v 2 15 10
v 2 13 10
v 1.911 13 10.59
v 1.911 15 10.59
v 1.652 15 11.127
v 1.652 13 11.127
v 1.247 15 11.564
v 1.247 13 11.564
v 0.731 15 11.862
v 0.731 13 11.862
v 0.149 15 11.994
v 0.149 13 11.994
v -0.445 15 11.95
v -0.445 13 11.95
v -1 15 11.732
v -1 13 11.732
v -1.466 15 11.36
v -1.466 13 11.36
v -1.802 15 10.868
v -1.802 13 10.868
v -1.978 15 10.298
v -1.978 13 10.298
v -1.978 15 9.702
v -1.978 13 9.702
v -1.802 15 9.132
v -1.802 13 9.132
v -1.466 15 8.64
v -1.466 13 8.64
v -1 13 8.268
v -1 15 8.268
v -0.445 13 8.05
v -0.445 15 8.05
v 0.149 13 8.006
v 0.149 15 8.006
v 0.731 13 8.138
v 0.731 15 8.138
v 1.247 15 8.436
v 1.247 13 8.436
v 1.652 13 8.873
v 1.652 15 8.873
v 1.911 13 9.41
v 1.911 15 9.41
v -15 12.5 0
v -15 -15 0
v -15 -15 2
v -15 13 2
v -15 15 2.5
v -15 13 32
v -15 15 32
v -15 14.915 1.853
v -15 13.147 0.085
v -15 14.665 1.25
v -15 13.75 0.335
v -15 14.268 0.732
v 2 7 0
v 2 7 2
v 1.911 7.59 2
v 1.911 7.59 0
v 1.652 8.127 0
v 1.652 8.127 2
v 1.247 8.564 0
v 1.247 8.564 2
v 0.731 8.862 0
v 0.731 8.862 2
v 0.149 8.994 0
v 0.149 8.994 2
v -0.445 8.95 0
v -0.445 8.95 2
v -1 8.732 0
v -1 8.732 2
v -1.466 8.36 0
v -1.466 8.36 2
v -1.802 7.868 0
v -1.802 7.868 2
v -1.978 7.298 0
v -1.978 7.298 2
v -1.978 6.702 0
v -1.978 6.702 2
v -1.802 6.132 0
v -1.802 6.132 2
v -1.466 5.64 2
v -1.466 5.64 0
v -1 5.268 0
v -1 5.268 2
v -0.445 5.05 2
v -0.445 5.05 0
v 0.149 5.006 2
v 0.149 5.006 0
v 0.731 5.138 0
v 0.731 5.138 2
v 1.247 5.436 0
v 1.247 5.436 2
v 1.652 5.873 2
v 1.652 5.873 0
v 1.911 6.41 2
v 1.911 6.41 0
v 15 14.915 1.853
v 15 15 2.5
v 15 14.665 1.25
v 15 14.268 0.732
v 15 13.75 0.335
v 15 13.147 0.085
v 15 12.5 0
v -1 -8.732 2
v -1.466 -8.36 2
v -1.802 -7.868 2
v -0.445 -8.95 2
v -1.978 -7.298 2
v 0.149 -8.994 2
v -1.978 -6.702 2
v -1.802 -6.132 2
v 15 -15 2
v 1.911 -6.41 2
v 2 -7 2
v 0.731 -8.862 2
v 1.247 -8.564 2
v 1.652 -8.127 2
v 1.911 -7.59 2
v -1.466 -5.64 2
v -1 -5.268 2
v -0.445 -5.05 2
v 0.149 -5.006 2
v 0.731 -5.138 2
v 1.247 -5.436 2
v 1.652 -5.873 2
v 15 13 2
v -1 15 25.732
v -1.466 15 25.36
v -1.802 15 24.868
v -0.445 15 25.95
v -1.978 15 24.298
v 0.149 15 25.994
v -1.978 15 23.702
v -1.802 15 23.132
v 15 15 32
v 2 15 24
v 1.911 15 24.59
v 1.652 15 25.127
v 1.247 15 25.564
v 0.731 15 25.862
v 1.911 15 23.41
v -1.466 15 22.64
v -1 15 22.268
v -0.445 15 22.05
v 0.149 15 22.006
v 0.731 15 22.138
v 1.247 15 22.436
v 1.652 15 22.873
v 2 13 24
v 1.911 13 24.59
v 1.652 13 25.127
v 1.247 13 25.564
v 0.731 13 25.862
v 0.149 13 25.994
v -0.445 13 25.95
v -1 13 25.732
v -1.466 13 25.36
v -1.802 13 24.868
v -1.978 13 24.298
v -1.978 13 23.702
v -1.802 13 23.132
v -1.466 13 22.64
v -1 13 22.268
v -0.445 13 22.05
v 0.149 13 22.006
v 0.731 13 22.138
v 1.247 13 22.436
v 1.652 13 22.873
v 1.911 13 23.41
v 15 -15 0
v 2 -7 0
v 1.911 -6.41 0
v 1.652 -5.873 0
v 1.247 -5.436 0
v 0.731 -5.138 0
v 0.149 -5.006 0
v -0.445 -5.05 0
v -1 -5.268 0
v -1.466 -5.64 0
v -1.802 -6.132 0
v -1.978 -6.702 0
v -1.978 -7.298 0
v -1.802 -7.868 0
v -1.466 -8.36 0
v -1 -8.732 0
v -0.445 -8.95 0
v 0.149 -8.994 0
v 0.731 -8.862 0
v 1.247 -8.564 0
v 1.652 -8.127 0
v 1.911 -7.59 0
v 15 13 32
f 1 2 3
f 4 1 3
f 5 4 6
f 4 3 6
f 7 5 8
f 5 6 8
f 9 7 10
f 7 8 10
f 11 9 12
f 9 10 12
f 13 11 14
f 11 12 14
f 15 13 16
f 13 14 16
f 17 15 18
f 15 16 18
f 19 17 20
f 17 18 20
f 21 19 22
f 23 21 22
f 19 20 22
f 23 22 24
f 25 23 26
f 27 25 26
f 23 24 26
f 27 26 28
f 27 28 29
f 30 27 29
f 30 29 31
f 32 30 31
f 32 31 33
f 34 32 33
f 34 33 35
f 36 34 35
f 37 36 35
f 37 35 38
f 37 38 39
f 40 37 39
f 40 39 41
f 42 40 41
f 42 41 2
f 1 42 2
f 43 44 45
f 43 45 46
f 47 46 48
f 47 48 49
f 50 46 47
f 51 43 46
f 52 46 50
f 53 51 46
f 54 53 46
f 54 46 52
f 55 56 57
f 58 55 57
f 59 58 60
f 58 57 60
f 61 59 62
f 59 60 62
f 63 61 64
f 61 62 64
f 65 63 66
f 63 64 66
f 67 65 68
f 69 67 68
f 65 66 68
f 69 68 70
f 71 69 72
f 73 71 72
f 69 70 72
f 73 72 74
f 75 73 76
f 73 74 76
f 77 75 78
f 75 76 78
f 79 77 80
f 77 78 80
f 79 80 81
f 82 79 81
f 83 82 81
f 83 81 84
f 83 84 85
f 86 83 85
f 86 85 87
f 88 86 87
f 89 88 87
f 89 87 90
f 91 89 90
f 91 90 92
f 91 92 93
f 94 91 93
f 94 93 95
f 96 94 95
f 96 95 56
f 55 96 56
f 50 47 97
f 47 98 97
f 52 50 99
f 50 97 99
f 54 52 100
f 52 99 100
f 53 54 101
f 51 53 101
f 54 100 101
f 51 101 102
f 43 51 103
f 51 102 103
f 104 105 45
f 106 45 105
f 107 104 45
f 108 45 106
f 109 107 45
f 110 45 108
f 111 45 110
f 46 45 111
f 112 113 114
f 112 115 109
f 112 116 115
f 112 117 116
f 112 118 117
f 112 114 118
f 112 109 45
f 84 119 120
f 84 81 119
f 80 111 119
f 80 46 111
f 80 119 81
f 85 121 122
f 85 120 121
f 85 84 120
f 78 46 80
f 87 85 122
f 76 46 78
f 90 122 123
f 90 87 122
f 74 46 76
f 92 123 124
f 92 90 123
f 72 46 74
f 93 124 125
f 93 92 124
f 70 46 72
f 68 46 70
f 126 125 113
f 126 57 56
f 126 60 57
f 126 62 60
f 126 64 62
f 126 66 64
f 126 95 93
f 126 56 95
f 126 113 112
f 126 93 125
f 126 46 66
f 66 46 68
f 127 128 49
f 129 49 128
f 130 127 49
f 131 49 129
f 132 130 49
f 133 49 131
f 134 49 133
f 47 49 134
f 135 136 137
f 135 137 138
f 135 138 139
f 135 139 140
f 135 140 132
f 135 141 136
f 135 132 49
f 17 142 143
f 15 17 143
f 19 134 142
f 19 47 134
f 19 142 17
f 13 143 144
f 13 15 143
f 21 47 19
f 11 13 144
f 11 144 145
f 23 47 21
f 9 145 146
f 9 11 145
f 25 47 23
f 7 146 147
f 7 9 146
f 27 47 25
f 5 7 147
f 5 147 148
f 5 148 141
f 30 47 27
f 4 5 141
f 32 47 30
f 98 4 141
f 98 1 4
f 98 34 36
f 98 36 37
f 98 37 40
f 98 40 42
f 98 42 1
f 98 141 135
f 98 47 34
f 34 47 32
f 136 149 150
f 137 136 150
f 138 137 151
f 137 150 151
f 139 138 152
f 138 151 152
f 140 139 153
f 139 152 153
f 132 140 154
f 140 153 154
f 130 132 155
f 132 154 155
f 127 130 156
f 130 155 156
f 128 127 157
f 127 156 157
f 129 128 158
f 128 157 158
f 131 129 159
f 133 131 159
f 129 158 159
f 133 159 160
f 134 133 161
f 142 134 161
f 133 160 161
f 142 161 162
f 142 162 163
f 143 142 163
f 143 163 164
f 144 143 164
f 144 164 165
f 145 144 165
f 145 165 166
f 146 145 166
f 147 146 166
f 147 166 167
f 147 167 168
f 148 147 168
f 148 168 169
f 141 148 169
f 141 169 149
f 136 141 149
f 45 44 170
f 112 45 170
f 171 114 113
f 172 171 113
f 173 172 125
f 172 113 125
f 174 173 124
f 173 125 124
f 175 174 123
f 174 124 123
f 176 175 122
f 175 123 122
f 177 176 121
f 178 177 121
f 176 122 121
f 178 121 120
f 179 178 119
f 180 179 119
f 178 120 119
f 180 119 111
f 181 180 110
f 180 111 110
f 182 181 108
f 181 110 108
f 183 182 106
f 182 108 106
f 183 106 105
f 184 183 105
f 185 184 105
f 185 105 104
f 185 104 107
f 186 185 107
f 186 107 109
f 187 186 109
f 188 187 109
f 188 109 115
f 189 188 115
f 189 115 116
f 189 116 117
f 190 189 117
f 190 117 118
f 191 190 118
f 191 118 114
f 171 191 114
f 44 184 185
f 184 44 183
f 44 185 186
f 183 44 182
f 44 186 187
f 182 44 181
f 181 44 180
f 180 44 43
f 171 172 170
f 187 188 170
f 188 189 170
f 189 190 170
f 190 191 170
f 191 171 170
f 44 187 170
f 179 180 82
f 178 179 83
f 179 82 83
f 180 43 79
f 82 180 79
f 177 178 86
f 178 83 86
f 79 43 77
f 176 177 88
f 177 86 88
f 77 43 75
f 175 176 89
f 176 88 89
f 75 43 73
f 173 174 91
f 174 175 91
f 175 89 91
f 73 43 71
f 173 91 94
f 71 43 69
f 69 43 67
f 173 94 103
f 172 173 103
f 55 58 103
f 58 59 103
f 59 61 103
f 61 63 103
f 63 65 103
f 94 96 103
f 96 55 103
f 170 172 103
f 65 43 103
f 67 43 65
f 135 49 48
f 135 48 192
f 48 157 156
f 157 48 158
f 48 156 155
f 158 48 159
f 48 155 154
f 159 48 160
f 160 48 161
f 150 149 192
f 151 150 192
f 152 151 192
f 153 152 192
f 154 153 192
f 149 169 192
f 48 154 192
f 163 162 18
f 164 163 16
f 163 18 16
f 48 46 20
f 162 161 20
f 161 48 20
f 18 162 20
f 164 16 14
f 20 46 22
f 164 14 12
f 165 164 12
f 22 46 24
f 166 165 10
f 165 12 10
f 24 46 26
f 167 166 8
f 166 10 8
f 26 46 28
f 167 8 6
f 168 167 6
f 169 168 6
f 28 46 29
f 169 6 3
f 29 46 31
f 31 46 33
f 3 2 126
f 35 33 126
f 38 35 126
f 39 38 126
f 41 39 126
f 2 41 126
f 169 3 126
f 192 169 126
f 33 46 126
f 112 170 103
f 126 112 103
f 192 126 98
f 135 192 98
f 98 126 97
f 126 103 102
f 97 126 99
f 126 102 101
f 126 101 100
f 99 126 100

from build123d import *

# Parameters (mm, degrees)
F0_W     = 30
F0_H     = 30
F1_DEPTH = 2
F2_R     = 2
F3_DEPTH = 25
F2_W     = 30
F2_H     = 2
F4_DEPTH = 30
F5_R     = 2
F6_DEPTH = 25
F7_R     = 2.5


with BuildPart() as f1:
    # F0 (on Top) → F1 (new body)
    with BuildSketch(Plane.XY):
        Rectangle(F0_W, F0_H)
    extrude(amount=F1_DEPTH)

    # F2 (on face) → F3 (cut)
    with BuildSketch(Plane.XY.offset(2)):
        with Locations((0, 7)):
            Circle(F2_R)
        with Locations((0, -7)):
            Circle(F2_R)
    extrude(amount=-F3_DEPTH, mode=Mode.SUBTRACT)

    # F2 (on face) → F4 (join)
    with BuildSketch(Plane.XY.offset(2)):
        with Locations((0, 14)):
            Rectangle(F2_W, F2_H)
    extrude(amount=F4_DEPTH)

    # F5 (on face) → F6 (cut)
    with BuildSketch(Plane.XZ.offset(-13)):
        with Locations((0, 24)):
            Circle(F5_R)
        with Locations((0, 10)):
            Circle(F5_R)
    extrude(amount=-F6_DEPTH, mode=Mode.SUBTRACT)

    # F7
    f7_edges = [f1.edges().sort_by_distance(p)[0] for p in [
        (0, 15, 0),
    ]]
    fillet(f7_edges, radius=F7_R)


solid = f1.part
